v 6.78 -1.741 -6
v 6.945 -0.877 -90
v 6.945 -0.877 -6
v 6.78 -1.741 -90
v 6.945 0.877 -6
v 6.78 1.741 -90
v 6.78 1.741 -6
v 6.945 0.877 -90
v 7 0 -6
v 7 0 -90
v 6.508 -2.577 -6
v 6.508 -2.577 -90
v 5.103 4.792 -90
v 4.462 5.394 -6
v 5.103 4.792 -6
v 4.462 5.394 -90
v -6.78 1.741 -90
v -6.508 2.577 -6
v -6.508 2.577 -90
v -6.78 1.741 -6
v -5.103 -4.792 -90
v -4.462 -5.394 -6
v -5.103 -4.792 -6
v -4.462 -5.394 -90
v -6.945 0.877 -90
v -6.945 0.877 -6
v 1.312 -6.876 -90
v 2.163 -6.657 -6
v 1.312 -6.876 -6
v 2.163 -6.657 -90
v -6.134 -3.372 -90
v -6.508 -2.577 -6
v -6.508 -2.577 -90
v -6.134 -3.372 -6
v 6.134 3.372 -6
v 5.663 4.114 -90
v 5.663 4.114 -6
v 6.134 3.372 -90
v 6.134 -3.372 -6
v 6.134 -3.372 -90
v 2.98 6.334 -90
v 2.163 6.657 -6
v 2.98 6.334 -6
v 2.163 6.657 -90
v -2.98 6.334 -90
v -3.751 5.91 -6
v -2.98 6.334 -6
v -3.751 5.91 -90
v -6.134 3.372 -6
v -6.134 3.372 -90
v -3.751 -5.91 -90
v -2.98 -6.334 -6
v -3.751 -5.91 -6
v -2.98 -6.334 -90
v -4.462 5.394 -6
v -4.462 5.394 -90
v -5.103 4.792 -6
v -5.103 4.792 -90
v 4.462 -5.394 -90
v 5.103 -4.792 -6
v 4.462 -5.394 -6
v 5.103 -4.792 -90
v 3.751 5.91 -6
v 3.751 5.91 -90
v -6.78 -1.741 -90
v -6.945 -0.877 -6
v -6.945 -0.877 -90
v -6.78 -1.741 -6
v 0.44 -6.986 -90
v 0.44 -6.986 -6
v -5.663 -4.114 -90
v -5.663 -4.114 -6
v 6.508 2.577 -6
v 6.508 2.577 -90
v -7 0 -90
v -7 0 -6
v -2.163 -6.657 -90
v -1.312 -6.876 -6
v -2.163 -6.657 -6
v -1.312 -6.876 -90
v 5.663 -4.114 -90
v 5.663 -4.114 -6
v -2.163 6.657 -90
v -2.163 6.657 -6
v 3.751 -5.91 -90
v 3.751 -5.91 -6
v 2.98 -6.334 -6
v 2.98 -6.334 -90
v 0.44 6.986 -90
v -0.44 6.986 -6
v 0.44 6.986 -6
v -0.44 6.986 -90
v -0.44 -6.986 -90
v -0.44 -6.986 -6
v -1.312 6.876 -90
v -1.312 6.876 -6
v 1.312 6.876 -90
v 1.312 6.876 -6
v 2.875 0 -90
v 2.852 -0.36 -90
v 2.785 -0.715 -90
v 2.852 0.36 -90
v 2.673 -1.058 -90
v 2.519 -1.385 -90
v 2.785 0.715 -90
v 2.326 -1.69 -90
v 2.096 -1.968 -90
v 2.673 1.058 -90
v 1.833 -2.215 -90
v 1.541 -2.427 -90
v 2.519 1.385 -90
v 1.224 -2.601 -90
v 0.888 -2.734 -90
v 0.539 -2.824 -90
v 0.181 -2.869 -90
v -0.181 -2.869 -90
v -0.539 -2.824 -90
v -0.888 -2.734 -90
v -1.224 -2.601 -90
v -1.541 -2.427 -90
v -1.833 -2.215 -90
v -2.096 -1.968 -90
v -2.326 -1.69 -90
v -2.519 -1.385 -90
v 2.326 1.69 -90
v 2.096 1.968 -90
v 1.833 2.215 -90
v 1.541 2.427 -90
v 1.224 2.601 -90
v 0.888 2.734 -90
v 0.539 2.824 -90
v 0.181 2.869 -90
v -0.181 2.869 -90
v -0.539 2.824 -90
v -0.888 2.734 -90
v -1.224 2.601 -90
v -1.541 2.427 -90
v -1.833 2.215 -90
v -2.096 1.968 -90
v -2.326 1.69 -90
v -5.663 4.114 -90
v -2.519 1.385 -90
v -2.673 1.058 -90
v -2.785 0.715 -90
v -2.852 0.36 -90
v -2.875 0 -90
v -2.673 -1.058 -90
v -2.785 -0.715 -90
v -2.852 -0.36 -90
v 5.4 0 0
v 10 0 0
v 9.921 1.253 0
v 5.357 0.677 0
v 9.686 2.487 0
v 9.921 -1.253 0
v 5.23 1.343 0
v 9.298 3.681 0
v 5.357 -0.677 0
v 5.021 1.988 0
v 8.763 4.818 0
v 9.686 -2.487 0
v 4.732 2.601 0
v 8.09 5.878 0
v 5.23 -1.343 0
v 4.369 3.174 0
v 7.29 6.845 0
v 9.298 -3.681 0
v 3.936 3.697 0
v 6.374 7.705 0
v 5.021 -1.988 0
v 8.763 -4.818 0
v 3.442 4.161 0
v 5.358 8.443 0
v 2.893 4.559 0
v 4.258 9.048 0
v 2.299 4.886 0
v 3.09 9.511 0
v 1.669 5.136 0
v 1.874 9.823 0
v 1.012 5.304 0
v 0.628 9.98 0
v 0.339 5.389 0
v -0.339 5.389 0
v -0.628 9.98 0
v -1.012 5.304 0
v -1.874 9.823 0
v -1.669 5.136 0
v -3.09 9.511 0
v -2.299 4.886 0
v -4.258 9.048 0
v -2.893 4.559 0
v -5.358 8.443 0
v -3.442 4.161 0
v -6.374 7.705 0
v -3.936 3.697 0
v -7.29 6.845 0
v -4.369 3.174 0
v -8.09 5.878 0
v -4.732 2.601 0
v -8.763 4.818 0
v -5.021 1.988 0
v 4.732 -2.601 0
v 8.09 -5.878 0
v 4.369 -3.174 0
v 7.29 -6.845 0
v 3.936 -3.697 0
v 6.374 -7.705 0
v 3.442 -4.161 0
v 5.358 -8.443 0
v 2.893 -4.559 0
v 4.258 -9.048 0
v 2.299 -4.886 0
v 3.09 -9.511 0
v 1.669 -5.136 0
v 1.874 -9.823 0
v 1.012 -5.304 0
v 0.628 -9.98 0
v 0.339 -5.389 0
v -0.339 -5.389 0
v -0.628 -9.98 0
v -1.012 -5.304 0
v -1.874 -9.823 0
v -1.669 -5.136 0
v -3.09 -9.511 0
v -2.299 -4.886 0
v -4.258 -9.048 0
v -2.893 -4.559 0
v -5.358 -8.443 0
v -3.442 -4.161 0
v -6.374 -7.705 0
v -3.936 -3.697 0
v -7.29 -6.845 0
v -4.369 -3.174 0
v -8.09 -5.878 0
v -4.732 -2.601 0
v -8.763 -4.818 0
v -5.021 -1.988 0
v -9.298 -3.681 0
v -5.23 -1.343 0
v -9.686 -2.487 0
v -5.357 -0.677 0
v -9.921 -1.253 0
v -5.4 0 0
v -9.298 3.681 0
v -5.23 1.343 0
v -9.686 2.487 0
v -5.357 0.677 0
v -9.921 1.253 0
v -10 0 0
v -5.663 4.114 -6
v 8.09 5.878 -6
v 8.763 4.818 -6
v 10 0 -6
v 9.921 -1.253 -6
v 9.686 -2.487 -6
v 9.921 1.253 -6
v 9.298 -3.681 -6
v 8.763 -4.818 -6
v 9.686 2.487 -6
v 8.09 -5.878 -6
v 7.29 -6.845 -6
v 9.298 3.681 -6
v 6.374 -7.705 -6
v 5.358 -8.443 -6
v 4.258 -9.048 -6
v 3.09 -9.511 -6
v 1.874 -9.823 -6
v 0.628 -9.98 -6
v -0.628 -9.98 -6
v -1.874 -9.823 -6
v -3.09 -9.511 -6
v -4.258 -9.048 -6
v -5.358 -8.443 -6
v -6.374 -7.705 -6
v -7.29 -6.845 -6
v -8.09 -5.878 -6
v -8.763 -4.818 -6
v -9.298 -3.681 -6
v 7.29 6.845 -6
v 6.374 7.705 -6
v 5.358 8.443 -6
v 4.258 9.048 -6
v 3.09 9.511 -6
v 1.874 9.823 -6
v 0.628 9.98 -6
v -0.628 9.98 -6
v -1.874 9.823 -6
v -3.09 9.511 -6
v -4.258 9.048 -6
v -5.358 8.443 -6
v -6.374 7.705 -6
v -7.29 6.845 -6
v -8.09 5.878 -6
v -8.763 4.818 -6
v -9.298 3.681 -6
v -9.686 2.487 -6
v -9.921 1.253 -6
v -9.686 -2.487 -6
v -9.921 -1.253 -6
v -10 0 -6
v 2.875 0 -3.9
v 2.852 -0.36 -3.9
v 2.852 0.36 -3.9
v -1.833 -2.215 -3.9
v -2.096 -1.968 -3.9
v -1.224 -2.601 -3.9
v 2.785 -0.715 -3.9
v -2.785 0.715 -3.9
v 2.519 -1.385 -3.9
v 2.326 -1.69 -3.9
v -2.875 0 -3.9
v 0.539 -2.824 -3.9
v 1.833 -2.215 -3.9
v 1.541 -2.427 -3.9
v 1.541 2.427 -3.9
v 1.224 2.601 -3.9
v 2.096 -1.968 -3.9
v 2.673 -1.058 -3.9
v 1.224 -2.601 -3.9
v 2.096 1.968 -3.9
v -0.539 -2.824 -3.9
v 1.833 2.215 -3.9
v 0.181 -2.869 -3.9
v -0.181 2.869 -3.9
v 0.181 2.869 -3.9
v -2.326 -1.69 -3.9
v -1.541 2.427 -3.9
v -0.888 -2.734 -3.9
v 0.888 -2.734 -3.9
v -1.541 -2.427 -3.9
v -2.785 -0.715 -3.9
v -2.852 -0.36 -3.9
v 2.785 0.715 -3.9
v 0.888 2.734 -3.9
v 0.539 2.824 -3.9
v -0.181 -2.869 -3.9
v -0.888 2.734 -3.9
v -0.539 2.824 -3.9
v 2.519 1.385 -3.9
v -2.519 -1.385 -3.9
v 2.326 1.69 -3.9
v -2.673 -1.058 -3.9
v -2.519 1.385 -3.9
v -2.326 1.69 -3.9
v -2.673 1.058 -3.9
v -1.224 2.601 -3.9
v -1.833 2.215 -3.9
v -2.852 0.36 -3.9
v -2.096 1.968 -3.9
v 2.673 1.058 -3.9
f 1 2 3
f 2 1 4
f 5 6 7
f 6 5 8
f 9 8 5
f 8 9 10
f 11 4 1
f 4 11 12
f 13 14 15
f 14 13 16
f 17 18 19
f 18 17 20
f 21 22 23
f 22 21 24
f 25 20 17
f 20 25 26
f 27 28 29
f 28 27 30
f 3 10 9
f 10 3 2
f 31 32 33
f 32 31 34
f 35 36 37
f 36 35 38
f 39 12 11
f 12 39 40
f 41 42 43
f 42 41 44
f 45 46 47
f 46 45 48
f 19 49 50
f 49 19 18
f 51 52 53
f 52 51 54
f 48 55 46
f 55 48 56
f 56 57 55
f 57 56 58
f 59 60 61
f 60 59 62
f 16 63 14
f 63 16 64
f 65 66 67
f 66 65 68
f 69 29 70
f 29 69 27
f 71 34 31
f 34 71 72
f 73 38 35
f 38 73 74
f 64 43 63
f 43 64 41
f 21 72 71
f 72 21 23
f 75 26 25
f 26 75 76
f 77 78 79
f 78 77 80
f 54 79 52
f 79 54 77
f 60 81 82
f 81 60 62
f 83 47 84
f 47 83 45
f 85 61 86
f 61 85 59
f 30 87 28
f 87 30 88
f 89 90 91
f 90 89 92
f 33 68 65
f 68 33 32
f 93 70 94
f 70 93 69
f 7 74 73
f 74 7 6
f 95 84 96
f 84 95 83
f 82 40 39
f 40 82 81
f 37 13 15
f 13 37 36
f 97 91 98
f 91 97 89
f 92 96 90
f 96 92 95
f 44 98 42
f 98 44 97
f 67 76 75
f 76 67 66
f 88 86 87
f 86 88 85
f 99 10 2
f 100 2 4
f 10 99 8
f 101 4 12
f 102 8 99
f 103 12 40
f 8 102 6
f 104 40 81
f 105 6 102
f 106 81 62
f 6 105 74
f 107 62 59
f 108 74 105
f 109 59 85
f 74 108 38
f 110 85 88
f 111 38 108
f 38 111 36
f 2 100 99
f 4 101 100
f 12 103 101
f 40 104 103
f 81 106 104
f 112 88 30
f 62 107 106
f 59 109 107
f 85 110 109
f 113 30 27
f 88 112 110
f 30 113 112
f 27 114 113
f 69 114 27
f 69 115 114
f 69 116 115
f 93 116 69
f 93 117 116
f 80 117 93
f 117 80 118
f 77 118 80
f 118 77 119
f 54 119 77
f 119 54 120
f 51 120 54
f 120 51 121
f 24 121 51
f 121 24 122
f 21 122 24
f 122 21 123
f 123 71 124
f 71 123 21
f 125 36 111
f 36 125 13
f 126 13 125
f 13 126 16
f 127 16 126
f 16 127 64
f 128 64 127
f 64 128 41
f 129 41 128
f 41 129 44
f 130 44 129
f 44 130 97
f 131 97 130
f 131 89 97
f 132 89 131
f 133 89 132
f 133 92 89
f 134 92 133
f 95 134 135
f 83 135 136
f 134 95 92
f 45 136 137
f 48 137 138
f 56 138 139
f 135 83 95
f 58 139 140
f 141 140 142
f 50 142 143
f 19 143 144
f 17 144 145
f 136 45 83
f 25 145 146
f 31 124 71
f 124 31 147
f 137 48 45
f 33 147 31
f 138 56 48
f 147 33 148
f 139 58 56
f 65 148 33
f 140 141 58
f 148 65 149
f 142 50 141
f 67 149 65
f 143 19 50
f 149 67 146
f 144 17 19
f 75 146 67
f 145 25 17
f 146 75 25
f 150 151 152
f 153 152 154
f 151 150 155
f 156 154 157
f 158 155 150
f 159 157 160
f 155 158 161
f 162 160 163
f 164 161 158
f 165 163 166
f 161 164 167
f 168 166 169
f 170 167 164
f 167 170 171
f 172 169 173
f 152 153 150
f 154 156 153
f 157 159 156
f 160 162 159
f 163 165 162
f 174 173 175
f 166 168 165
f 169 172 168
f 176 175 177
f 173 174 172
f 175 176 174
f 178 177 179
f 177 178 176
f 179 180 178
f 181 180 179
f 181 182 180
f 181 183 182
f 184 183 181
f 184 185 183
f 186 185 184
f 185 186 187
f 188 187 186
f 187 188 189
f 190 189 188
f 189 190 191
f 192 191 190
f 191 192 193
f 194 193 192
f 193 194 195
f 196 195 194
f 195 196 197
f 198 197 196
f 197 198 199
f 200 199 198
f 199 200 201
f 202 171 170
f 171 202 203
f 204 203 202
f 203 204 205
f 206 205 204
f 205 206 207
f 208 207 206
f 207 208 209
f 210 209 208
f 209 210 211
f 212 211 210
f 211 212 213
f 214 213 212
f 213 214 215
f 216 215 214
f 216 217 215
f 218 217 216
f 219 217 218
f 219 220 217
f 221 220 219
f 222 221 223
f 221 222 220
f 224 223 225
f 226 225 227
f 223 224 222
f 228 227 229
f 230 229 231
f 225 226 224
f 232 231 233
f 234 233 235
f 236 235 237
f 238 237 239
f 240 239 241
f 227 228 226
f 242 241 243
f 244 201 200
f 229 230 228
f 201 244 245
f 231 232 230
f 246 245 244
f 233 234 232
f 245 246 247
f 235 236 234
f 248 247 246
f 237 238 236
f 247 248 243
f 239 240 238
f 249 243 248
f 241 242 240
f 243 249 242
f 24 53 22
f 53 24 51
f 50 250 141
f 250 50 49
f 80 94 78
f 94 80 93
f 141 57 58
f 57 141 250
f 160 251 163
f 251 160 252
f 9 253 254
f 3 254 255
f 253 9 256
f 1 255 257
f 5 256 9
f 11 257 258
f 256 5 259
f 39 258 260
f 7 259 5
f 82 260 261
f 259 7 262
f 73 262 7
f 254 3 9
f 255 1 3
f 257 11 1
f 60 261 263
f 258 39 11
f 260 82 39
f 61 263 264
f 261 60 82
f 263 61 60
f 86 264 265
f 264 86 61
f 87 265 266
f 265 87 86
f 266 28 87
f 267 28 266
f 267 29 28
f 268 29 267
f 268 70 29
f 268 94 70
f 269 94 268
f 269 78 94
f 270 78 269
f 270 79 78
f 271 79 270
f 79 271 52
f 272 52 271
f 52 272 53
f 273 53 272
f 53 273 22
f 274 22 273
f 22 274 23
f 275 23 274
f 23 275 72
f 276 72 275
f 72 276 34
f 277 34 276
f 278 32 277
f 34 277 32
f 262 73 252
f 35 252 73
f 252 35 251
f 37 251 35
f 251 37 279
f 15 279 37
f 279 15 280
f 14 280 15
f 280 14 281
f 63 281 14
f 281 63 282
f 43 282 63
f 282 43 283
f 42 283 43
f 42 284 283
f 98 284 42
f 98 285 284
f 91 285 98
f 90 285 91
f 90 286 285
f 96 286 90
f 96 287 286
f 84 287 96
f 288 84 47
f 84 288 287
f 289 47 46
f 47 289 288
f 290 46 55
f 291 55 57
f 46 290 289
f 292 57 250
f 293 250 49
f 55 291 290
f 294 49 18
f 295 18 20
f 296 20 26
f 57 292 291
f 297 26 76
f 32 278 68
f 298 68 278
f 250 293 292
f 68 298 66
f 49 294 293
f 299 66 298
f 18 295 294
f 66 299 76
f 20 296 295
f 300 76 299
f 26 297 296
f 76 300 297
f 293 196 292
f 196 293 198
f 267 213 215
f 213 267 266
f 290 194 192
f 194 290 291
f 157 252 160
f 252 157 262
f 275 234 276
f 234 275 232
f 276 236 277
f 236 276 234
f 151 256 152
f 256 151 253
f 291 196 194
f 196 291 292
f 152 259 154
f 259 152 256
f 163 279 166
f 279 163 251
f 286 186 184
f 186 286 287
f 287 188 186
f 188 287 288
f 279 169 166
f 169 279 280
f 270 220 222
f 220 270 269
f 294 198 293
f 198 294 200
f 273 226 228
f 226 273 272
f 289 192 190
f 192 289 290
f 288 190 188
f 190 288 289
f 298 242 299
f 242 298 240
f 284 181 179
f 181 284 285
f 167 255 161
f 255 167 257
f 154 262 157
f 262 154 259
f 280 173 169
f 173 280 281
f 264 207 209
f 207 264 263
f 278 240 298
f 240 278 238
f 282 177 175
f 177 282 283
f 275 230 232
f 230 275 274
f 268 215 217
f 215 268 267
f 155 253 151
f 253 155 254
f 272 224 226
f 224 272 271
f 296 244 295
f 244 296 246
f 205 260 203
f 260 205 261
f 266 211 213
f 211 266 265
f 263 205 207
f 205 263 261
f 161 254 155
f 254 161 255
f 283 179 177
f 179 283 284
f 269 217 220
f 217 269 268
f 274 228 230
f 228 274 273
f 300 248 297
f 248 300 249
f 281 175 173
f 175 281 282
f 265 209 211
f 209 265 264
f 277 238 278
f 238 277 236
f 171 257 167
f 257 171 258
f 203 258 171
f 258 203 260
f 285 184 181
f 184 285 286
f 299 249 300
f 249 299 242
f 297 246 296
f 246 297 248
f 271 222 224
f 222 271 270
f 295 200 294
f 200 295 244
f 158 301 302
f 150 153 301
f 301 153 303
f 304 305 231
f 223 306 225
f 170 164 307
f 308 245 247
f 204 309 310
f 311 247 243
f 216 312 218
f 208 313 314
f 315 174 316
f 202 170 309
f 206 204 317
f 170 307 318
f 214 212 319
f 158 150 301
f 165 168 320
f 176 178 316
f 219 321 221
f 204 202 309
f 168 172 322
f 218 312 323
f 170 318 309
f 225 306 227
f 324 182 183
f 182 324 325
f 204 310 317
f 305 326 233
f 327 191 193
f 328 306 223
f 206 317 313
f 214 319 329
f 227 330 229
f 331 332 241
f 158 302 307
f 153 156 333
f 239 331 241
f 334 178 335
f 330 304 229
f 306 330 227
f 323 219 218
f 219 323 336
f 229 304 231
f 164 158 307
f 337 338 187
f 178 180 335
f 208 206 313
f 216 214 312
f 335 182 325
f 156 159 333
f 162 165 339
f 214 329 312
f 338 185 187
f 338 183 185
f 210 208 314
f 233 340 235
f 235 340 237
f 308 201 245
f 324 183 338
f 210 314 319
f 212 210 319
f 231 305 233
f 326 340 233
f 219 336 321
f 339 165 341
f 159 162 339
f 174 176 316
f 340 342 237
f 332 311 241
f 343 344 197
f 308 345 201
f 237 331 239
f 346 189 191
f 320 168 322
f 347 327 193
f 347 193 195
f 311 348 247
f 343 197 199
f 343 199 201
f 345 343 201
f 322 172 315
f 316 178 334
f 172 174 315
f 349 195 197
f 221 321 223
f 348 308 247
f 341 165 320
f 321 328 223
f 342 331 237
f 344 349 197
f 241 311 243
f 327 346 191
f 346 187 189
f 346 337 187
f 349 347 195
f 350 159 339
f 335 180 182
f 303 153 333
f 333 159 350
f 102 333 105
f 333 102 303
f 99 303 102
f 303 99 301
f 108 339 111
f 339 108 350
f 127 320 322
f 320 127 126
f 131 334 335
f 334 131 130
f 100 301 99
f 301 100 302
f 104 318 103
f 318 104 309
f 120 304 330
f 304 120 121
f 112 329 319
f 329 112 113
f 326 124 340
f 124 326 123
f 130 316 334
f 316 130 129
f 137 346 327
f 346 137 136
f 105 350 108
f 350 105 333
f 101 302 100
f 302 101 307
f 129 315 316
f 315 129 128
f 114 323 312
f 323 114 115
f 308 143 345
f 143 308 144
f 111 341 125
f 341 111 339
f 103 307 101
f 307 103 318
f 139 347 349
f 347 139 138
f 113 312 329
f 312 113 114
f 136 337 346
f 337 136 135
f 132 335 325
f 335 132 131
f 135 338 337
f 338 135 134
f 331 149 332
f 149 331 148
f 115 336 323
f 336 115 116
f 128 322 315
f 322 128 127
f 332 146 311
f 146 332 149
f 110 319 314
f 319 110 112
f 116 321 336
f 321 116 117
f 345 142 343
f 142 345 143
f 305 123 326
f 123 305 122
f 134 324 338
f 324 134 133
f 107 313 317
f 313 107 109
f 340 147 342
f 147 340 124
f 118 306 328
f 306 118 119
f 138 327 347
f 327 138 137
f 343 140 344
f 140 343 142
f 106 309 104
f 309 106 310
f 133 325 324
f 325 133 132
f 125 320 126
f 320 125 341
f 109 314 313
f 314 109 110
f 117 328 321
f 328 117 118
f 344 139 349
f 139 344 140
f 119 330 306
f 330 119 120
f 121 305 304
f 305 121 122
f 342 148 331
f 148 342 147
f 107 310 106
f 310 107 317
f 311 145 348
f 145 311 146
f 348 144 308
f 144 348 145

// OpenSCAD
$fn = 50;


difference() {
	union() {
		translate(v = [0, 0, -90.0000000000]) {
			cylinder(h = 90, r = 7.0000000000);
		}
		translate(v = [0, 0, -6.0000000000]) {
			cylinder(h = 6, r = 10.0000000000);
		}
	}
	union() {
		translate(v = [0, 0, 0]) {
			rotate(a = [0, 0, 0]) {
				difference() {
					union() {
						#translate(v = [0, 0, -90.0000000000]) {
							cylinder(h = 90, r = 2.6000000000);
						}
						#translate(v = [0, 0, -3.9000000000]) {
							cylinder(h = 3.9000000000, r = 7.0000000000, r1 = 2.8750000000, r2 = 5.4000000000);
						}
						#translate(v = [0, 0, -90.0000000000]) {
							cylinder(h = 90, r = 2.8750000000);
						}
						#translate(v = [0, 0, -90.0000000000]) {
							cylinder(h = 90, r = 2.6000000000);
						}
					}
					union();
				}
			}
		}
	}
}
